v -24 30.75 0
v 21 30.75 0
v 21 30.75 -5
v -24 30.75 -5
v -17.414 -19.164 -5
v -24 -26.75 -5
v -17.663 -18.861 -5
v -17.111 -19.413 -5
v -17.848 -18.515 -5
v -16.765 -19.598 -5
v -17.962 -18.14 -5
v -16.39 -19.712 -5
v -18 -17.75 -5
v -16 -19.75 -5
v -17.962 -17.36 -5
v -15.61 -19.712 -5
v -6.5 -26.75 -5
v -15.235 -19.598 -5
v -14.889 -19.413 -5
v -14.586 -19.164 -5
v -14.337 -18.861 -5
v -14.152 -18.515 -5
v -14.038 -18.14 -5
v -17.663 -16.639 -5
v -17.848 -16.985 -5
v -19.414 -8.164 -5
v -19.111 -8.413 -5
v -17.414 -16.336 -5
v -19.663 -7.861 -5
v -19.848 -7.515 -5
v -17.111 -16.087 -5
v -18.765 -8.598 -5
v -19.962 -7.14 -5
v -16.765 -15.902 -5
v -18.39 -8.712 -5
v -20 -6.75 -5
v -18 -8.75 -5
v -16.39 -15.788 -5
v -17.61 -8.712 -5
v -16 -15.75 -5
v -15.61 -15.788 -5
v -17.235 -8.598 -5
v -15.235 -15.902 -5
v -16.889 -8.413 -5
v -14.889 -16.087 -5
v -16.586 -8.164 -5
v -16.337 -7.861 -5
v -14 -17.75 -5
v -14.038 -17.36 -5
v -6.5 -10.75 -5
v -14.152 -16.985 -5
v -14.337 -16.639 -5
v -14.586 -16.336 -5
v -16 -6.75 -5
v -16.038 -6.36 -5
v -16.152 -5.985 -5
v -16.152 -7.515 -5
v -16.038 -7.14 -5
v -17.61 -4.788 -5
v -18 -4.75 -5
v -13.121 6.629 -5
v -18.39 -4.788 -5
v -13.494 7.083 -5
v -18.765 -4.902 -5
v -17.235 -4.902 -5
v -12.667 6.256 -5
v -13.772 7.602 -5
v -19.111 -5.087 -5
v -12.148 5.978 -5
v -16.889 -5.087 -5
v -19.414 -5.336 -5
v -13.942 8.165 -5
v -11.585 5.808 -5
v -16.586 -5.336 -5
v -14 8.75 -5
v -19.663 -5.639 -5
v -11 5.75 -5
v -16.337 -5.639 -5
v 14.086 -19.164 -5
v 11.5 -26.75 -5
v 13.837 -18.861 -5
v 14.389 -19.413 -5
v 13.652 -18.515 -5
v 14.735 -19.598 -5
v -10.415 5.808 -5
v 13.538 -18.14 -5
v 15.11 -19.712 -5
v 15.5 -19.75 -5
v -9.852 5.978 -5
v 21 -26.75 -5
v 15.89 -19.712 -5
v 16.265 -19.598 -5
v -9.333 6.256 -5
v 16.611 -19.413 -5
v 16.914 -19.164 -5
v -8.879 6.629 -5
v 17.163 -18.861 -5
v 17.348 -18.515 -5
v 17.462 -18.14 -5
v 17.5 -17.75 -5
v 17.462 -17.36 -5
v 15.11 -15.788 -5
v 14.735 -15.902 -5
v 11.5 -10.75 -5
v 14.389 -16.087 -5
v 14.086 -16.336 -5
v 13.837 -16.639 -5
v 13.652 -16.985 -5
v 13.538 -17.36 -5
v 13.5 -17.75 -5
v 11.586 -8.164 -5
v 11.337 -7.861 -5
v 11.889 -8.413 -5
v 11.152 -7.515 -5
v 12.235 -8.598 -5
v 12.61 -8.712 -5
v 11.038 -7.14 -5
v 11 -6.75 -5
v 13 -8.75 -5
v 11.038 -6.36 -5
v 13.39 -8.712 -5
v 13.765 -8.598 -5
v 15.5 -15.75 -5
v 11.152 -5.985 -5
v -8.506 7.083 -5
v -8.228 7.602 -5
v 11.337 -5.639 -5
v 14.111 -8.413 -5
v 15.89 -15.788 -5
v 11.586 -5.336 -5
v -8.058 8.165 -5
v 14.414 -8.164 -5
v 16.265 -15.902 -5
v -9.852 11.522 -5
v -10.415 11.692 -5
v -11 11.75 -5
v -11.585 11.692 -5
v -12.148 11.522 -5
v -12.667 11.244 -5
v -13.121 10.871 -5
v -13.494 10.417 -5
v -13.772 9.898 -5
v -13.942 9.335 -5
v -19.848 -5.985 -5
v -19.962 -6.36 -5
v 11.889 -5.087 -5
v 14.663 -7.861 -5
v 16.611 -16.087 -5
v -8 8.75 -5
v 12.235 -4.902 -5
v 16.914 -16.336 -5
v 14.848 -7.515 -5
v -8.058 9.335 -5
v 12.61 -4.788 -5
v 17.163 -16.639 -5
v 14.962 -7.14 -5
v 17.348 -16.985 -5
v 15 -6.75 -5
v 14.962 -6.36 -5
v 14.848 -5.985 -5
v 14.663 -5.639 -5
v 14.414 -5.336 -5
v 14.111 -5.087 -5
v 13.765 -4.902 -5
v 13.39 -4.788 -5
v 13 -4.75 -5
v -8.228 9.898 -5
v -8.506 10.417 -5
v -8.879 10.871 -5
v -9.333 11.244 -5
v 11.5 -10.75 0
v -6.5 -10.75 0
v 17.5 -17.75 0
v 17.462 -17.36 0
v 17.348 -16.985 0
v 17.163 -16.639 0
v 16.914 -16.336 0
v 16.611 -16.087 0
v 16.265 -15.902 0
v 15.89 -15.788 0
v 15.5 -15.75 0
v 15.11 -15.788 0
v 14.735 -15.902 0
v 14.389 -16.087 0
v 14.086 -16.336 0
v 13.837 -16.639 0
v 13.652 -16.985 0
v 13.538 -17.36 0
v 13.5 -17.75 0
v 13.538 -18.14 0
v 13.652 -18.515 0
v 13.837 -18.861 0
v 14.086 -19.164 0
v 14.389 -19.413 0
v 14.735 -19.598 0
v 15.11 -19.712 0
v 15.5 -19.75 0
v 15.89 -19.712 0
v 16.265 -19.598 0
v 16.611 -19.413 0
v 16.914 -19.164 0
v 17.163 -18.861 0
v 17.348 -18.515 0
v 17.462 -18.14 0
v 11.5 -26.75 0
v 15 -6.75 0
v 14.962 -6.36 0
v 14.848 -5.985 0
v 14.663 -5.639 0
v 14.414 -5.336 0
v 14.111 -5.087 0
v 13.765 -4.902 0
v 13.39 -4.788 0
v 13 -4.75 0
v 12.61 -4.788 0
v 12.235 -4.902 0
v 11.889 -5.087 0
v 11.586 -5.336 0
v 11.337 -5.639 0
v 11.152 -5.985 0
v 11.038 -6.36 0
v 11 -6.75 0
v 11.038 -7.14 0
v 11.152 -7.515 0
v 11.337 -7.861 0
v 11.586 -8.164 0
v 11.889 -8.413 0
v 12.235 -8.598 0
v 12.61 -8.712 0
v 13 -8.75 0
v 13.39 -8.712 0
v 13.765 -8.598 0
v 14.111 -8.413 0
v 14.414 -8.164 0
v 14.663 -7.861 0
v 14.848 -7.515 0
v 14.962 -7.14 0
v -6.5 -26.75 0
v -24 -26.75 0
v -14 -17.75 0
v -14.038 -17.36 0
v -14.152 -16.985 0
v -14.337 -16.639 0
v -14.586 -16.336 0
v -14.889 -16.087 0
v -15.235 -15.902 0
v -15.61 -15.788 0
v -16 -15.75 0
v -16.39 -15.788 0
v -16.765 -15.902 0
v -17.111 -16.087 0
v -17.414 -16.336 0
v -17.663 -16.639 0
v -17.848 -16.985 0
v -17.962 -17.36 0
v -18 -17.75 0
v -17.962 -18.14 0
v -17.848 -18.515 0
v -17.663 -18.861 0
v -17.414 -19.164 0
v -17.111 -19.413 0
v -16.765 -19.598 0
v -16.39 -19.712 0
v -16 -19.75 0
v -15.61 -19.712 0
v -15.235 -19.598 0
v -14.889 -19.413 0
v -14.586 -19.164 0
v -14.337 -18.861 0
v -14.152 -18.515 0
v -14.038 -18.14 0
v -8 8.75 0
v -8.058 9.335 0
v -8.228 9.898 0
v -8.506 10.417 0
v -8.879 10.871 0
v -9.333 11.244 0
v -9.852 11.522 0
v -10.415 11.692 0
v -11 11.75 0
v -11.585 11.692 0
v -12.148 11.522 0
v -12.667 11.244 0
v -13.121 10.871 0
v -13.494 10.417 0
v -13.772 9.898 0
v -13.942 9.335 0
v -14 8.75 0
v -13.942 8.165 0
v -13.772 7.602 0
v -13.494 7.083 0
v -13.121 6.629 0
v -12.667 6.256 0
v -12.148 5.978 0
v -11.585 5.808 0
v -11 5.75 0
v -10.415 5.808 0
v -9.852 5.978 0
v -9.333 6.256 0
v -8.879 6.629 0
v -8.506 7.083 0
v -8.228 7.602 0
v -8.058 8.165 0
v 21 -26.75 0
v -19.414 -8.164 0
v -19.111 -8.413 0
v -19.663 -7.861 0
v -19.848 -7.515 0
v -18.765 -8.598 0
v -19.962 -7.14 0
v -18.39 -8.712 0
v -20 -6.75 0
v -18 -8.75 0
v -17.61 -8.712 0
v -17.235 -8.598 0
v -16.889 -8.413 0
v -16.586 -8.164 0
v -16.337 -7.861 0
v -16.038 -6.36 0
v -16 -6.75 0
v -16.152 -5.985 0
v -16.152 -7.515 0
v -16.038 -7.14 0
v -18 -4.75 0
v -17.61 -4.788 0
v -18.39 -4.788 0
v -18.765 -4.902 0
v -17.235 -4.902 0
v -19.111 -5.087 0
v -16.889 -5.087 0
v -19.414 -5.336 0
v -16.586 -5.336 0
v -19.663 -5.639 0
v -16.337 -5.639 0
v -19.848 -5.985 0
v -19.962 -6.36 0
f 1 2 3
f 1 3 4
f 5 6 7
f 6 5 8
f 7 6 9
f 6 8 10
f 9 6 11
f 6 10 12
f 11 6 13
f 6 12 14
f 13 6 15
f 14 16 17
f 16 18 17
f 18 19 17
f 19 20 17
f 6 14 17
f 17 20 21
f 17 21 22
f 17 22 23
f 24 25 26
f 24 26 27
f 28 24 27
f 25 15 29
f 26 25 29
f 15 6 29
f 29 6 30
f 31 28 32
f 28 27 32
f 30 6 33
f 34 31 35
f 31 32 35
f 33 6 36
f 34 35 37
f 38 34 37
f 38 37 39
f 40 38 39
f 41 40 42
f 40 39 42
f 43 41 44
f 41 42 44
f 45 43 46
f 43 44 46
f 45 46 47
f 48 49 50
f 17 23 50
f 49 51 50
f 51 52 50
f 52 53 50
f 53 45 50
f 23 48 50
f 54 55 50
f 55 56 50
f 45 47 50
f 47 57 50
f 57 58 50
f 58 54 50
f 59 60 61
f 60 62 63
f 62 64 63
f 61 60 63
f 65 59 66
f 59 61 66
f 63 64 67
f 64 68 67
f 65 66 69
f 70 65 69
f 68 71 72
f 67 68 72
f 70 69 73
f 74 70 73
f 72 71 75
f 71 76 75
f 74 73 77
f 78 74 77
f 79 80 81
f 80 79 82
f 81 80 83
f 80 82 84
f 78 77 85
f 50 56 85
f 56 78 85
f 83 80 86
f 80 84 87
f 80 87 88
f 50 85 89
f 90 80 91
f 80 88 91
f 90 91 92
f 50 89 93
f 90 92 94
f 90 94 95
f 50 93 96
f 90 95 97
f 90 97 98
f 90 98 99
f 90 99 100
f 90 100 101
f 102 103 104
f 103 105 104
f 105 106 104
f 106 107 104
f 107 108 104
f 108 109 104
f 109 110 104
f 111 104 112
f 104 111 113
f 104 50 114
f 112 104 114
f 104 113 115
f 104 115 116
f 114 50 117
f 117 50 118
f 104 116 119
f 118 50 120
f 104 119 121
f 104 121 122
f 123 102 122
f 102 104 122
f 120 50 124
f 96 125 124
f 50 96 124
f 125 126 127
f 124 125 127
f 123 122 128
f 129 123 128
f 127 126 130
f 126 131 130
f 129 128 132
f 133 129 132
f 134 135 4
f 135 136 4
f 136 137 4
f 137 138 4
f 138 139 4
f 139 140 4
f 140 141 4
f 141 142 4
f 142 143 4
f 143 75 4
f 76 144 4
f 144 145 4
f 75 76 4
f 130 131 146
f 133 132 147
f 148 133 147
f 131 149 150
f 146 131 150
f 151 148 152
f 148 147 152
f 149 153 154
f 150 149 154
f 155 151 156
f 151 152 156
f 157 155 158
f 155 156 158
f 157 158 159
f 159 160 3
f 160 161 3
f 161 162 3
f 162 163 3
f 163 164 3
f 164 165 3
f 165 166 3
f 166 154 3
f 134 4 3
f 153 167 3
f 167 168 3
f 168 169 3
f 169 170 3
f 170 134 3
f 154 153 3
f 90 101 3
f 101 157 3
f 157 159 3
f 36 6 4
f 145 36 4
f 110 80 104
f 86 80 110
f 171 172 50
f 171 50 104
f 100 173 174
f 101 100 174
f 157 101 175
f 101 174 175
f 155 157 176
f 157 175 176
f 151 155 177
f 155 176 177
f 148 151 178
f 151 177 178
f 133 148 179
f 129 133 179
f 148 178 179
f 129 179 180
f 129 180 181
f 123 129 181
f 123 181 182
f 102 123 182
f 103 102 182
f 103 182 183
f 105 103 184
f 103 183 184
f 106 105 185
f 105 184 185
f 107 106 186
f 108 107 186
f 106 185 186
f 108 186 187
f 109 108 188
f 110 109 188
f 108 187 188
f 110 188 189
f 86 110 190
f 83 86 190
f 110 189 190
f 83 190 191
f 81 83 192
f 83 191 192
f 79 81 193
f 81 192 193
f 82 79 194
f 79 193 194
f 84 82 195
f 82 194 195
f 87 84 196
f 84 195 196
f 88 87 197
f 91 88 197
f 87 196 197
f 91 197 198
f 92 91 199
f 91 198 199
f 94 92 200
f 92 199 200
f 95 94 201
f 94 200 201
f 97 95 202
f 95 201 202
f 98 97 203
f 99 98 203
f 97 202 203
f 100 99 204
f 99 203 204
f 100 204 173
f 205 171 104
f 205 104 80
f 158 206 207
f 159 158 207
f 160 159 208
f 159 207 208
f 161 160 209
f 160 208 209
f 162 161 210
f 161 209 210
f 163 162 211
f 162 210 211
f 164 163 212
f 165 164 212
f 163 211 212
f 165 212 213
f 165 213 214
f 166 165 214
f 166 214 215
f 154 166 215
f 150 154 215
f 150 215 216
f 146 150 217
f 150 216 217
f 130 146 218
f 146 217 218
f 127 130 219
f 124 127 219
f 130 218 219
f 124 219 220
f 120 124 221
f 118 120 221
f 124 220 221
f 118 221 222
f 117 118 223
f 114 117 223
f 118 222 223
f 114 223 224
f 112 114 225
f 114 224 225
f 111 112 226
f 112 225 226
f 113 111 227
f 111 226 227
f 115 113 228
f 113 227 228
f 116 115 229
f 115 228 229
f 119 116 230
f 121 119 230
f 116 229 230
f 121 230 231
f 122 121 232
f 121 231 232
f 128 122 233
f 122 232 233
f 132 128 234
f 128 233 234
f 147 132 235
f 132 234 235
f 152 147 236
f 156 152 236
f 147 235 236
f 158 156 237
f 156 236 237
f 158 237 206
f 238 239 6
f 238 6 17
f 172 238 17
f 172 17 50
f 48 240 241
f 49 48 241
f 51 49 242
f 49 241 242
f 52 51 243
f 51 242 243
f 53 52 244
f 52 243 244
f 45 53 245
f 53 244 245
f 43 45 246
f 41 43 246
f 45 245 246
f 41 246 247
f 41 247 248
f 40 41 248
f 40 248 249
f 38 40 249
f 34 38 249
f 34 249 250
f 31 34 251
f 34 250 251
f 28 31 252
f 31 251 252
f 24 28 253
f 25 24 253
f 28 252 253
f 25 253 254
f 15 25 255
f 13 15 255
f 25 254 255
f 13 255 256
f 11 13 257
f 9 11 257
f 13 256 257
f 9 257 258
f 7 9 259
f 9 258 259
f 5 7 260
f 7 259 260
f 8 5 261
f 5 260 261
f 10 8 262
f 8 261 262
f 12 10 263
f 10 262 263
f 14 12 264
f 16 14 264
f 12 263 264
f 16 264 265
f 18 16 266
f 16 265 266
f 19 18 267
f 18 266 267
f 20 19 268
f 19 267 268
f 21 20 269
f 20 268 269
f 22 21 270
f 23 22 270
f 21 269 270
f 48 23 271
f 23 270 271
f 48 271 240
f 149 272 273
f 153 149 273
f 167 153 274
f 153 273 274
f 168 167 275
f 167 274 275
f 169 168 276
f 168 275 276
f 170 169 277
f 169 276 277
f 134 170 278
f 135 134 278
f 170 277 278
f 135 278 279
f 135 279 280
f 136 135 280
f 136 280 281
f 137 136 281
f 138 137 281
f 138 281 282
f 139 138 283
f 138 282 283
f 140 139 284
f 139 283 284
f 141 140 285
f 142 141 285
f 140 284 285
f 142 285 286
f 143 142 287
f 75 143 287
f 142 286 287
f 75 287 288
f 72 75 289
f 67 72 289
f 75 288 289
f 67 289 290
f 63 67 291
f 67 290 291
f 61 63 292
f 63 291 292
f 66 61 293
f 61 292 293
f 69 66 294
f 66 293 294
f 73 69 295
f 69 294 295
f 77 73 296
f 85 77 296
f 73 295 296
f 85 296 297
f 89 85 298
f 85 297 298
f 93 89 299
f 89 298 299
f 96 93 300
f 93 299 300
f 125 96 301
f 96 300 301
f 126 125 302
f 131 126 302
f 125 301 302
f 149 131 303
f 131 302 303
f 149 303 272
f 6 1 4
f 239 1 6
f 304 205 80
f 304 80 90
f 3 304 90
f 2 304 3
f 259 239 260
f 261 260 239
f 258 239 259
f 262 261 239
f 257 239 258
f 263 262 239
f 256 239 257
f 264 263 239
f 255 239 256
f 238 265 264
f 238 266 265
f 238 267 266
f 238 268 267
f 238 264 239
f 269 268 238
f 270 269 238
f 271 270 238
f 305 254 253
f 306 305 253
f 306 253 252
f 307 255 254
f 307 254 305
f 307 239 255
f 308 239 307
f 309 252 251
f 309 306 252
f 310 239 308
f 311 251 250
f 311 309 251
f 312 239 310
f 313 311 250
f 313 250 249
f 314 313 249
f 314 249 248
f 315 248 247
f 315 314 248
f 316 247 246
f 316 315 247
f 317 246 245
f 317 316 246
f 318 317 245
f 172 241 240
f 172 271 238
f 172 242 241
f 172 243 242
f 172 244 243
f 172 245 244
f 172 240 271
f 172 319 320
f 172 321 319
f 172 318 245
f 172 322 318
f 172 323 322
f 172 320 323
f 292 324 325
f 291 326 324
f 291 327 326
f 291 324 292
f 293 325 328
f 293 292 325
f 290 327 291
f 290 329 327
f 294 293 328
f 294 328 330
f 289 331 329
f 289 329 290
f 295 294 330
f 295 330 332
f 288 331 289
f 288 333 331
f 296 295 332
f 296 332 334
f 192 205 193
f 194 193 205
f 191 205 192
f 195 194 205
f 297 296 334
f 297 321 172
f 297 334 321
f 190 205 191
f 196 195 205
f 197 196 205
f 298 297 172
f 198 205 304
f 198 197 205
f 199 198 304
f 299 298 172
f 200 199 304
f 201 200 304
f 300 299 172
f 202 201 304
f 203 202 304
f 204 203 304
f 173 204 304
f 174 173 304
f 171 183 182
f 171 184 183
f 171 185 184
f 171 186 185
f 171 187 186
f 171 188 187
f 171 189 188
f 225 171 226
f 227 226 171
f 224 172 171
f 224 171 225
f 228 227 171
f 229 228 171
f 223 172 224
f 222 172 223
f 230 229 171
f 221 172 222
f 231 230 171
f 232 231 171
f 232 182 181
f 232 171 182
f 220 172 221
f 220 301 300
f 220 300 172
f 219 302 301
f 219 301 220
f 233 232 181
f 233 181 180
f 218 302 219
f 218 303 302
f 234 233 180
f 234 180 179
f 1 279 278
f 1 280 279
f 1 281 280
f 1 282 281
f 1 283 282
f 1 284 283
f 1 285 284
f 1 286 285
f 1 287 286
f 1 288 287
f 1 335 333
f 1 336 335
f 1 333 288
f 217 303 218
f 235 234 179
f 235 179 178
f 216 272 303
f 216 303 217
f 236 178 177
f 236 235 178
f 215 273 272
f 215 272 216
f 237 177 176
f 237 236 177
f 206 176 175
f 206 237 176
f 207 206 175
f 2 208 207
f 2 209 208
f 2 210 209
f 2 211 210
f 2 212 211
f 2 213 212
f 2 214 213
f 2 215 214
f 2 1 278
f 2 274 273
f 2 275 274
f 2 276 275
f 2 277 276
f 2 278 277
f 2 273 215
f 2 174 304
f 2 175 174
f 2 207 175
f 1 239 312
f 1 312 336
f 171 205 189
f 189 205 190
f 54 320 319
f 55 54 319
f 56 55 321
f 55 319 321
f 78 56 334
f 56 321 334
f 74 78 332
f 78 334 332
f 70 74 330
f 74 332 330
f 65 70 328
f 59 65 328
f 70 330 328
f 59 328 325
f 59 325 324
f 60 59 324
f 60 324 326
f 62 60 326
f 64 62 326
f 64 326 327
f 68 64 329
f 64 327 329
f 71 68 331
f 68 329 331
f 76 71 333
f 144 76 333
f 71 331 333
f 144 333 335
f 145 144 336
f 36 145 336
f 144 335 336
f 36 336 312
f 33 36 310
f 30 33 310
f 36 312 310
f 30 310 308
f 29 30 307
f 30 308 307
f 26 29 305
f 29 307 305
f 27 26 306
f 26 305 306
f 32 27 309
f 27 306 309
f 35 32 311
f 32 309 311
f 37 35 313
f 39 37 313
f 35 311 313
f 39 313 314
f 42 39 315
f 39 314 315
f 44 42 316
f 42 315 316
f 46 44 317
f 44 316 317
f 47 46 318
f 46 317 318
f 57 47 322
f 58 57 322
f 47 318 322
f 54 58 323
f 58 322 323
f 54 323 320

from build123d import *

# Parameters (mm, degrees)
SKETCH2_R           = 2
SKETCH2_R_2         = 3
BOSS_EXTRUDE1_DEPTH = 5


with BuildPart() as part:
    # Sketch2 → Boss-Extrude1 (new body)
    with BuildSketch(Plane.XY):
        Polygon((21, 30.75), (-24, 30.75), (-24, -26.75), (-6.5, -26.75), (-6.5, -10.75), (11.5, -10.75), (11.5, -26.75), (21, -26.75), align=None)
        with Locations((-16, -17.75)):
            Circle(SKETCH2_R, mode=Mode.SUBTRACT)
        with Locations((-18, -6.75)):
            Circle(SKETCH2_R, mode=Mode.SUBTRACT)
        with Locations((15.5, -17.75)):
            Circle(SKETCH2_R, mode=Mode.SUBTRACT)
        with Locations((13, -6.75)):
            Circle(SKETCH2_R, mode=Mode.SUBTRACT)
        with Locations((-11, 8.75)):
            Circle(SKETCH2_R_2, mode=Mode.SUBTRACT)
    extrude(amount=-BOSS_EXTRUDE1_DEPTH)


solid = part.part
